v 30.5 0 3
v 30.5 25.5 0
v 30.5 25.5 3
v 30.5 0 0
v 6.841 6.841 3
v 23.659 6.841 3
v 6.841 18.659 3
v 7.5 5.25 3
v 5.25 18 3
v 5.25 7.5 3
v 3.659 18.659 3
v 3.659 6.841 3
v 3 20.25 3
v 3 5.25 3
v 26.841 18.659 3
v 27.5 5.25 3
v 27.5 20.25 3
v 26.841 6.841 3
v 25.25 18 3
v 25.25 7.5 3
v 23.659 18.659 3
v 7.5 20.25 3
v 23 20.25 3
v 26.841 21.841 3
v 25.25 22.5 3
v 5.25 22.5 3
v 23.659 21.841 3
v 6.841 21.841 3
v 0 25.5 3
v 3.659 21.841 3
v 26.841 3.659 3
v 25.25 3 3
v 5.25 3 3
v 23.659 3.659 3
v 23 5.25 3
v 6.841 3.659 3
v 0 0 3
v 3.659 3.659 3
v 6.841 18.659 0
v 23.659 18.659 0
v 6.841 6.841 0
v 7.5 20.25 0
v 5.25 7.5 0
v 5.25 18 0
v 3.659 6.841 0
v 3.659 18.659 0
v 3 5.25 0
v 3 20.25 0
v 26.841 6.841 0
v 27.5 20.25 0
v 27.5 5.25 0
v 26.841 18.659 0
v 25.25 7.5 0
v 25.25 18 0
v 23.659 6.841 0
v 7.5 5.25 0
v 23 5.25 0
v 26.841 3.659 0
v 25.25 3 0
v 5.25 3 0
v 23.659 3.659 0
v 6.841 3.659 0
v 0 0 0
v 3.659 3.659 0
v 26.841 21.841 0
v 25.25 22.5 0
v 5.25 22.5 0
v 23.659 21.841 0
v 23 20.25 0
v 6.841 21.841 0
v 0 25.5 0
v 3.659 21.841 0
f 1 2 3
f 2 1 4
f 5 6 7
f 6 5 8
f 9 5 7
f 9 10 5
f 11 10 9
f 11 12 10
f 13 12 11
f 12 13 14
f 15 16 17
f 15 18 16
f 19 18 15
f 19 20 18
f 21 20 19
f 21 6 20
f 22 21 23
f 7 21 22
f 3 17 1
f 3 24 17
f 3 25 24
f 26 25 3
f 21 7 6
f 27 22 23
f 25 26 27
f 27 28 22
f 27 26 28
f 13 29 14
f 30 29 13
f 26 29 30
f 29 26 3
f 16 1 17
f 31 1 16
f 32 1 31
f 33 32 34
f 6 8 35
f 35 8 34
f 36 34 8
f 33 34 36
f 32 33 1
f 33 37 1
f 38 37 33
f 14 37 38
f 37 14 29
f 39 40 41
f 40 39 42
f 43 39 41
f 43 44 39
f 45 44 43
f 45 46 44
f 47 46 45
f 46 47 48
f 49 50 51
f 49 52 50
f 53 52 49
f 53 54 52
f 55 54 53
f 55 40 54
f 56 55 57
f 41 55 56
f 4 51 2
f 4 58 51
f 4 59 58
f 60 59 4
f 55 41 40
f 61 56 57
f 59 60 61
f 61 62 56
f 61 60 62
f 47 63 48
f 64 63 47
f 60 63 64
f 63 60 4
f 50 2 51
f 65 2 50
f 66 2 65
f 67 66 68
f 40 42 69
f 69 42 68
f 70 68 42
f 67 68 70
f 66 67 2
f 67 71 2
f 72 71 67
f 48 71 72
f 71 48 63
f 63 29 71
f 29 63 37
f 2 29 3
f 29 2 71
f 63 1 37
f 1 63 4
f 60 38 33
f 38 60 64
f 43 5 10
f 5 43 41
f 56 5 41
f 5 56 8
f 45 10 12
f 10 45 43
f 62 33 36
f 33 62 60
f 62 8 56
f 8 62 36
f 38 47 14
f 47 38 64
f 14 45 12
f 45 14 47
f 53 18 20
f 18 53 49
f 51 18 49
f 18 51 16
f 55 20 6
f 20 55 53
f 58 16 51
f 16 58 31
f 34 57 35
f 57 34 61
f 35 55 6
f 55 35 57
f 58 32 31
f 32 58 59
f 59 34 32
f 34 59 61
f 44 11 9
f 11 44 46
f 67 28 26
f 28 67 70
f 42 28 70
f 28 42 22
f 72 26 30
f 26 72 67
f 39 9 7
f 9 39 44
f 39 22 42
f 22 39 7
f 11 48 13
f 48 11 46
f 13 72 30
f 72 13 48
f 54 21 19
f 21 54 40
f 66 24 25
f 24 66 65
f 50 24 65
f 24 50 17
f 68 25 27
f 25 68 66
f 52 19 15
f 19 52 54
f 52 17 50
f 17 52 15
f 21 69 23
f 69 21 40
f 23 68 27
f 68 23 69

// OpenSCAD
height = 3; //mm
squoojefactor = 1; //mm
screw = 3.5 + squoojefactor; //mm, ie a loose M3
wire = 1 + squoojefactor; //mm
thick = 3; //mm

length = 60; //mm

pairDistance = 20; //mm, distance between hole centres
elbowLength = 15; //mm, distance between hole centres


difference(){
cube([pairDistance + screw + (2*thick), elbowLength + screw + (2*thick), height]);

translate([thick + (screw/2), thick + (screw/2), 0]) cylinder(h=height, d=screw);
translate([thick + (screw/2) + pairDistance, thick + (screw/2), 0]) cylinder(h=height, d=screw);
translate([thick + (screw/2), thick + (screw/2) + elbowLength, 0]) cylinder(h=height, d=screw);
translate([thick + (screw/2) + pairDistance, thick + (screw/2) + elbowLength, 0]) cylinder(h=height, d=screw);
}
